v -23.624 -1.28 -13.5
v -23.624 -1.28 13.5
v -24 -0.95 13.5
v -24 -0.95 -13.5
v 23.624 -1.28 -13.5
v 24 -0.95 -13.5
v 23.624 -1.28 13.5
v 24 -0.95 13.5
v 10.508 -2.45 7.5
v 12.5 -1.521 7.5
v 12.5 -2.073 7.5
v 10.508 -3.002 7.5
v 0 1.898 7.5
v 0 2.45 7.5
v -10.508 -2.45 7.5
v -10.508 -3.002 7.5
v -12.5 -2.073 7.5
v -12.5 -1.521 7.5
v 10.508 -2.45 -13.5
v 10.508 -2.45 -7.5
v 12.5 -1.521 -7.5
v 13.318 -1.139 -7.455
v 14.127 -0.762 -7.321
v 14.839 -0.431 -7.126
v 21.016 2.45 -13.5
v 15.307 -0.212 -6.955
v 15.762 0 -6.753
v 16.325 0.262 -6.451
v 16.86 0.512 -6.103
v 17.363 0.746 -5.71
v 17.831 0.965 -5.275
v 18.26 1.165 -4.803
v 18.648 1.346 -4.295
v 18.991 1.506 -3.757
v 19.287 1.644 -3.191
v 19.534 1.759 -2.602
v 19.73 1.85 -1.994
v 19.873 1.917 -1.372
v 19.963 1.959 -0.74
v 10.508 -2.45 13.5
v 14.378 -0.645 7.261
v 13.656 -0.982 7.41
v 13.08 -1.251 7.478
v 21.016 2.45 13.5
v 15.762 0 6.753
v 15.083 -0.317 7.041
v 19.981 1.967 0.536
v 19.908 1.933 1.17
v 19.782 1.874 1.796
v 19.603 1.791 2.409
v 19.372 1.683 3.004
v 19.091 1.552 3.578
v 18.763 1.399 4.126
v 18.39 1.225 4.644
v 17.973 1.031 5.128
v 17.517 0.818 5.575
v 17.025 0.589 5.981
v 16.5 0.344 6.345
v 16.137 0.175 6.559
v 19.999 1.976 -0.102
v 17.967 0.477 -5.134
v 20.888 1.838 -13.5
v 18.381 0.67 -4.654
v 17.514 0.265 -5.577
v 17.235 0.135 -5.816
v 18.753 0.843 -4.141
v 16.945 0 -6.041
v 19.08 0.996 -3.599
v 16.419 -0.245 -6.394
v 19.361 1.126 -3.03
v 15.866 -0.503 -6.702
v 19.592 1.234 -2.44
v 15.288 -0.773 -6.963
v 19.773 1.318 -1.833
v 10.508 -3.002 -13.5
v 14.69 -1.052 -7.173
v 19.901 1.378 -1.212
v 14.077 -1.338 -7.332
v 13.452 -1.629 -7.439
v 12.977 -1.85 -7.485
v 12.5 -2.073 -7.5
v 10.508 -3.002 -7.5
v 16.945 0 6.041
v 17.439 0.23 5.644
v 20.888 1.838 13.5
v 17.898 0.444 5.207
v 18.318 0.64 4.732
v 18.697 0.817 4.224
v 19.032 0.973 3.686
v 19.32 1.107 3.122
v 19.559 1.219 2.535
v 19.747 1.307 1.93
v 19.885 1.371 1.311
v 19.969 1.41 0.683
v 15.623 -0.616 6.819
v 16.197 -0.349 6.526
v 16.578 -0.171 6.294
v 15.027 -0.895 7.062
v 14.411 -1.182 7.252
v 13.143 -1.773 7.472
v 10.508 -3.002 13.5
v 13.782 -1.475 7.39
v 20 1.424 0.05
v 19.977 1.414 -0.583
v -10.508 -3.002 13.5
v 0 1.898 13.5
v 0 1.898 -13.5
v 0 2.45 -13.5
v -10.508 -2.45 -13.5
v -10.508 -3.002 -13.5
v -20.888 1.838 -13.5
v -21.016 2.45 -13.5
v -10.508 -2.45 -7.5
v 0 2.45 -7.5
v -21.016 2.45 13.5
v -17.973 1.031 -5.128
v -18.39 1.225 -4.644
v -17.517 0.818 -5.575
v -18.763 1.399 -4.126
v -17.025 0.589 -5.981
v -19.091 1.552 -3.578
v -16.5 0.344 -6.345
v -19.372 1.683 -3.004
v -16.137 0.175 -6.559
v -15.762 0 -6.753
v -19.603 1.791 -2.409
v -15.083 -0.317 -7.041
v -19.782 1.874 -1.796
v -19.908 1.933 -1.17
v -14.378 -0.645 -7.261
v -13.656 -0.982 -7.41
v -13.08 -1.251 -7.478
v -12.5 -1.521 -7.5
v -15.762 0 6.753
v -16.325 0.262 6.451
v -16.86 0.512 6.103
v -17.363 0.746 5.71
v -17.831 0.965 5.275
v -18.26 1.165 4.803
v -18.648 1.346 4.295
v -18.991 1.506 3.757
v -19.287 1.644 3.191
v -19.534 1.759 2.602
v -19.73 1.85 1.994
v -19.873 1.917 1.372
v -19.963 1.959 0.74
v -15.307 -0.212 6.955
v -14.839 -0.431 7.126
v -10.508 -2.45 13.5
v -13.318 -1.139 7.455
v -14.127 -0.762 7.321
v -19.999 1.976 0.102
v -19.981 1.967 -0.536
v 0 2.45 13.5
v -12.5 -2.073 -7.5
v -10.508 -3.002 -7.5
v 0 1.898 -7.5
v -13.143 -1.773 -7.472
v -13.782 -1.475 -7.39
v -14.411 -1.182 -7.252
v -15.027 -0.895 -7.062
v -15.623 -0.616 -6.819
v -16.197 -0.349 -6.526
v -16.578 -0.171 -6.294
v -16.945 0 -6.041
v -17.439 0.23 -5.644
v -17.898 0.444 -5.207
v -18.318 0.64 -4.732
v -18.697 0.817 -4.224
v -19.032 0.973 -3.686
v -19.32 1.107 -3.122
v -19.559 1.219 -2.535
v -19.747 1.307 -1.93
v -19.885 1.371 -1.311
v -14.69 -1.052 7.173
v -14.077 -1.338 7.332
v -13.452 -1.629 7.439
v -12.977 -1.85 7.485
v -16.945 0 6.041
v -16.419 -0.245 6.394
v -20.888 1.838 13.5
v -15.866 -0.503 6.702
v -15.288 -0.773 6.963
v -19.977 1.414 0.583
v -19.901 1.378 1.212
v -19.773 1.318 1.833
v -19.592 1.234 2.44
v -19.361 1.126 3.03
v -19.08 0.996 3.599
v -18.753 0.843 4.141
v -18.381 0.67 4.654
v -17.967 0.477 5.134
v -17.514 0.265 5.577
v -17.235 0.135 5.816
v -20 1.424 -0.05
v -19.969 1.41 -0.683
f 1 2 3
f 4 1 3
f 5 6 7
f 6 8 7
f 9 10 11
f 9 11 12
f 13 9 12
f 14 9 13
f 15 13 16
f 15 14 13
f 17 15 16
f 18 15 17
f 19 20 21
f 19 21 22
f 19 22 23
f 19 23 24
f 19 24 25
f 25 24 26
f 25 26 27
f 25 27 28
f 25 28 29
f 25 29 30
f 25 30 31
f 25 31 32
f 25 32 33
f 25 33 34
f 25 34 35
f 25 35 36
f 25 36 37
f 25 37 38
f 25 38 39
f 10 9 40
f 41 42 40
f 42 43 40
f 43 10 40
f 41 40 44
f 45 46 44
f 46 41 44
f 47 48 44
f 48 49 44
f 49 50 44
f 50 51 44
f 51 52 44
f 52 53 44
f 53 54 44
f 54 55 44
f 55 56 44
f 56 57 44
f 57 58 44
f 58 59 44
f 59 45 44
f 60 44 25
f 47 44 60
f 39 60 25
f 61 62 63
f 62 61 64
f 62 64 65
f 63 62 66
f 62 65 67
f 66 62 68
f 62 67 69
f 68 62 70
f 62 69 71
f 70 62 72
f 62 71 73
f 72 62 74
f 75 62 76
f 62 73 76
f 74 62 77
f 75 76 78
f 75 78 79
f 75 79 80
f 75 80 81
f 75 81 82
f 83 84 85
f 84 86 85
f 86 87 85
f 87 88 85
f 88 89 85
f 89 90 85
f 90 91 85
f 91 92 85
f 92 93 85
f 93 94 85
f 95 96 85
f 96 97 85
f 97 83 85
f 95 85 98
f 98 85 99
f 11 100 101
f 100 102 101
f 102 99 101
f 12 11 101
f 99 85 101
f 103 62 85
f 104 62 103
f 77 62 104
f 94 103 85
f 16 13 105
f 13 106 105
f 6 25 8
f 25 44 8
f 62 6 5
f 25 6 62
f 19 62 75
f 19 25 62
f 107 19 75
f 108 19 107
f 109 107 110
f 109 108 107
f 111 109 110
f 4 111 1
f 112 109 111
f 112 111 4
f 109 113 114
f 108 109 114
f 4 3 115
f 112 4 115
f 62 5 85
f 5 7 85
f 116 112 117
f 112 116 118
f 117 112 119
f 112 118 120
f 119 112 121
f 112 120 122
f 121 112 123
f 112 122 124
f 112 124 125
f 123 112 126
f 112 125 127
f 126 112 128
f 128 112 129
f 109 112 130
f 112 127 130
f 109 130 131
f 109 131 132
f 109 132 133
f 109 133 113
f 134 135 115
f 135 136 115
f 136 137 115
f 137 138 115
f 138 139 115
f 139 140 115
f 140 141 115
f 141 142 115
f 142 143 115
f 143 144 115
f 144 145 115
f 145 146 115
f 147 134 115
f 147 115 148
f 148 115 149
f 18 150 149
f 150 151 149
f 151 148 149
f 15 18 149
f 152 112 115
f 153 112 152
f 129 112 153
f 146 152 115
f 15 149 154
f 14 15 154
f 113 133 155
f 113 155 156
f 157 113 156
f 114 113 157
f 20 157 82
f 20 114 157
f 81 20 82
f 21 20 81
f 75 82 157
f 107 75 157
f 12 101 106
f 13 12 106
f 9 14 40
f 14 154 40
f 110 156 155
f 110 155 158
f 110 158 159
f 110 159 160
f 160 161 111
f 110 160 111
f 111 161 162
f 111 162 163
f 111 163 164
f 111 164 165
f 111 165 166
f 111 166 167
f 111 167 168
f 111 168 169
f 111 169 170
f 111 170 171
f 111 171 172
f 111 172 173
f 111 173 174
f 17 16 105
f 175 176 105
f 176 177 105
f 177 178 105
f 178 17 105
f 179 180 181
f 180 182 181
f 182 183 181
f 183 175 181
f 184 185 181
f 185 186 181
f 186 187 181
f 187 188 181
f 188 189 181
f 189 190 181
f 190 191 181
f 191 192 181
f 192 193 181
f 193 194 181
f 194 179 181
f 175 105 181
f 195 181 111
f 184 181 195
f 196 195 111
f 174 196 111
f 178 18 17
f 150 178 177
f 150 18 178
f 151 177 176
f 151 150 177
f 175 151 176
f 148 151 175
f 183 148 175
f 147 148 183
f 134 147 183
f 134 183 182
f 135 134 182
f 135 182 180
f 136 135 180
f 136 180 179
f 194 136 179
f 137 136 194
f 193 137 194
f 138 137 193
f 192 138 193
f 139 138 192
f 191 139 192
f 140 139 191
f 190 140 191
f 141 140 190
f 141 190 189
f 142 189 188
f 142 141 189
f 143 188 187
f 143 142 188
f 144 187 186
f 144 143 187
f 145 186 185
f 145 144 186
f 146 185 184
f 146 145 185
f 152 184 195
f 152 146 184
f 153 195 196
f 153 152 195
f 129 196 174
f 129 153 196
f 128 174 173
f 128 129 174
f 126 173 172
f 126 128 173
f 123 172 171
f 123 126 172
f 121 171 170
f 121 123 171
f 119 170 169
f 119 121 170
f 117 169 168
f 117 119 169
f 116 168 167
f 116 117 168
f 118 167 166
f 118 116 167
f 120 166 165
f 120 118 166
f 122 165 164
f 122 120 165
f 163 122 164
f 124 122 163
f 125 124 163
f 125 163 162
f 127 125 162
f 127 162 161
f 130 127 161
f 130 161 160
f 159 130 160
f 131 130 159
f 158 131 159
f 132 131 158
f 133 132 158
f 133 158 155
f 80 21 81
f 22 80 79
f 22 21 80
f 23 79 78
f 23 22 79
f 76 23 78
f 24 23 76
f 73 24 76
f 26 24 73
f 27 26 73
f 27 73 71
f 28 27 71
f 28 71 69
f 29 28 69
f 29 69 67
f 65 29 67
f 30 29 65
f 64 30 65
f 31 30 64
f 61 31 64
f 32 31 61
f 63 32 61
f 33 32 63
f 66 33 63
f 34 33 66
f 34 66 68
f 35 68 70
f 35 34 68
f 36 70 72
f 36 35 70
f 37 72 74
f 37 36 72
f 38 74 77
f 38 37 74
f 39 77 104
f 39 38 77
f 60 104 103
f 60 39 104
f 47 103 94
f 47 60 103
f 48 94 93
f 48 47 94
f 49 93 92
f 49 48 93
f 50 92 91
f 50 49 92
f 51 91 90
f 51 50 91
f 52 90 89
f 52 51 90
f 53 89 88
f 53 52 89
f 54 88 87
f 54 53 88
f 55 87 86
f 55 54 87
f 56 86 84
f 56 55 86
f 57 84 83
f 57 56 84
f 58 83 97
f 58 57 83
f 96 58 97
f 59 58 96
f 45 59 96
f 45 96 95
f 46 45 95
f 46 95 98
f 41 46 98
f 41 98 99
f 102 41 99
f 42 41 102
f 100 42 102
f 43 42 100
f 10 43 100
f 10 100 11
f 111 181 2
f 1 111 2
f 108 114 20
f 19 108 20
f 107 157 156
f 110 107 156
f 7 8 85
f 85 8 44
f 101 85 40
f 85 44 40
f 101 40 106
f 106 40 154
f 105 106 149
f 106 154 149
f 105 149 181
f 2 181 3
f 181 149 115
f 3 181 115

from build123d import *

# Parameters (mm, degrees)
EXTRU_MINCE1_DEPTH           = 13.5
ENL_V_MAT_EXTRU_1_DEPTH      = 3.45
ENL_V_MAT_EXTRU_1_DEPTH_BACK = 4.001688959


with BuildPart() as part:
    # Esquisse1 → Extru.-Mince1 (new body, symmetric)
    with BuildSketch(Plane.XY):
        Polygon((-24, -0.95), (-21.016167821, 2.45), (-10.50808391, -2.45), (0, 2.45), (10.50808391, -2.45), (21.016167821, 2.45), (24, -0.95), (23.624195852, -1.279804855), (20.887672756, 1.838392808), (10.50808391, -3.001688959), (0, 1.898311041), (-10.50808391, -3.001688959), (-20.887672756, 1.838392808), (-23.624195852, -1.279804855), align=None)
    extrude(amount=EXTRU_MINCE1_DEPTH, both=True)

    # Esquisse2 → Enlèv. mat.-Extru.1 (cut, two sides)
    with BuildSketch(Plane(origin=(0, 0, 0), x_dir=(1, 0, 0), z_dir=(0, 1, 0))) as enl_v_mat_extru_1_sk:
        with BuildLine():
            Line((-12.5, 7.5), (12.5, 7.5))
            ThreePointArc((12.5, 7.5), (20, 0), (12.5, -7.5))
            Line((12.5, -7.5), (-12.5, -7.5))
            ThreePointArc((-12.5, -7.5), (-20, 0), (-12.5, 7.5))
        make_face()
    extrude(amount=ENL_V_MAT_EXTRU_1_DEPTH, mode=Mode.SUBTRACT)
    extrude(enl_v_mat_extru_1_sk.sketch, amount=-ENL_V_MAT_EXTRU_1_DEPTH_BACK, mode=Mode.SUBTRACT)


solid = part.part
